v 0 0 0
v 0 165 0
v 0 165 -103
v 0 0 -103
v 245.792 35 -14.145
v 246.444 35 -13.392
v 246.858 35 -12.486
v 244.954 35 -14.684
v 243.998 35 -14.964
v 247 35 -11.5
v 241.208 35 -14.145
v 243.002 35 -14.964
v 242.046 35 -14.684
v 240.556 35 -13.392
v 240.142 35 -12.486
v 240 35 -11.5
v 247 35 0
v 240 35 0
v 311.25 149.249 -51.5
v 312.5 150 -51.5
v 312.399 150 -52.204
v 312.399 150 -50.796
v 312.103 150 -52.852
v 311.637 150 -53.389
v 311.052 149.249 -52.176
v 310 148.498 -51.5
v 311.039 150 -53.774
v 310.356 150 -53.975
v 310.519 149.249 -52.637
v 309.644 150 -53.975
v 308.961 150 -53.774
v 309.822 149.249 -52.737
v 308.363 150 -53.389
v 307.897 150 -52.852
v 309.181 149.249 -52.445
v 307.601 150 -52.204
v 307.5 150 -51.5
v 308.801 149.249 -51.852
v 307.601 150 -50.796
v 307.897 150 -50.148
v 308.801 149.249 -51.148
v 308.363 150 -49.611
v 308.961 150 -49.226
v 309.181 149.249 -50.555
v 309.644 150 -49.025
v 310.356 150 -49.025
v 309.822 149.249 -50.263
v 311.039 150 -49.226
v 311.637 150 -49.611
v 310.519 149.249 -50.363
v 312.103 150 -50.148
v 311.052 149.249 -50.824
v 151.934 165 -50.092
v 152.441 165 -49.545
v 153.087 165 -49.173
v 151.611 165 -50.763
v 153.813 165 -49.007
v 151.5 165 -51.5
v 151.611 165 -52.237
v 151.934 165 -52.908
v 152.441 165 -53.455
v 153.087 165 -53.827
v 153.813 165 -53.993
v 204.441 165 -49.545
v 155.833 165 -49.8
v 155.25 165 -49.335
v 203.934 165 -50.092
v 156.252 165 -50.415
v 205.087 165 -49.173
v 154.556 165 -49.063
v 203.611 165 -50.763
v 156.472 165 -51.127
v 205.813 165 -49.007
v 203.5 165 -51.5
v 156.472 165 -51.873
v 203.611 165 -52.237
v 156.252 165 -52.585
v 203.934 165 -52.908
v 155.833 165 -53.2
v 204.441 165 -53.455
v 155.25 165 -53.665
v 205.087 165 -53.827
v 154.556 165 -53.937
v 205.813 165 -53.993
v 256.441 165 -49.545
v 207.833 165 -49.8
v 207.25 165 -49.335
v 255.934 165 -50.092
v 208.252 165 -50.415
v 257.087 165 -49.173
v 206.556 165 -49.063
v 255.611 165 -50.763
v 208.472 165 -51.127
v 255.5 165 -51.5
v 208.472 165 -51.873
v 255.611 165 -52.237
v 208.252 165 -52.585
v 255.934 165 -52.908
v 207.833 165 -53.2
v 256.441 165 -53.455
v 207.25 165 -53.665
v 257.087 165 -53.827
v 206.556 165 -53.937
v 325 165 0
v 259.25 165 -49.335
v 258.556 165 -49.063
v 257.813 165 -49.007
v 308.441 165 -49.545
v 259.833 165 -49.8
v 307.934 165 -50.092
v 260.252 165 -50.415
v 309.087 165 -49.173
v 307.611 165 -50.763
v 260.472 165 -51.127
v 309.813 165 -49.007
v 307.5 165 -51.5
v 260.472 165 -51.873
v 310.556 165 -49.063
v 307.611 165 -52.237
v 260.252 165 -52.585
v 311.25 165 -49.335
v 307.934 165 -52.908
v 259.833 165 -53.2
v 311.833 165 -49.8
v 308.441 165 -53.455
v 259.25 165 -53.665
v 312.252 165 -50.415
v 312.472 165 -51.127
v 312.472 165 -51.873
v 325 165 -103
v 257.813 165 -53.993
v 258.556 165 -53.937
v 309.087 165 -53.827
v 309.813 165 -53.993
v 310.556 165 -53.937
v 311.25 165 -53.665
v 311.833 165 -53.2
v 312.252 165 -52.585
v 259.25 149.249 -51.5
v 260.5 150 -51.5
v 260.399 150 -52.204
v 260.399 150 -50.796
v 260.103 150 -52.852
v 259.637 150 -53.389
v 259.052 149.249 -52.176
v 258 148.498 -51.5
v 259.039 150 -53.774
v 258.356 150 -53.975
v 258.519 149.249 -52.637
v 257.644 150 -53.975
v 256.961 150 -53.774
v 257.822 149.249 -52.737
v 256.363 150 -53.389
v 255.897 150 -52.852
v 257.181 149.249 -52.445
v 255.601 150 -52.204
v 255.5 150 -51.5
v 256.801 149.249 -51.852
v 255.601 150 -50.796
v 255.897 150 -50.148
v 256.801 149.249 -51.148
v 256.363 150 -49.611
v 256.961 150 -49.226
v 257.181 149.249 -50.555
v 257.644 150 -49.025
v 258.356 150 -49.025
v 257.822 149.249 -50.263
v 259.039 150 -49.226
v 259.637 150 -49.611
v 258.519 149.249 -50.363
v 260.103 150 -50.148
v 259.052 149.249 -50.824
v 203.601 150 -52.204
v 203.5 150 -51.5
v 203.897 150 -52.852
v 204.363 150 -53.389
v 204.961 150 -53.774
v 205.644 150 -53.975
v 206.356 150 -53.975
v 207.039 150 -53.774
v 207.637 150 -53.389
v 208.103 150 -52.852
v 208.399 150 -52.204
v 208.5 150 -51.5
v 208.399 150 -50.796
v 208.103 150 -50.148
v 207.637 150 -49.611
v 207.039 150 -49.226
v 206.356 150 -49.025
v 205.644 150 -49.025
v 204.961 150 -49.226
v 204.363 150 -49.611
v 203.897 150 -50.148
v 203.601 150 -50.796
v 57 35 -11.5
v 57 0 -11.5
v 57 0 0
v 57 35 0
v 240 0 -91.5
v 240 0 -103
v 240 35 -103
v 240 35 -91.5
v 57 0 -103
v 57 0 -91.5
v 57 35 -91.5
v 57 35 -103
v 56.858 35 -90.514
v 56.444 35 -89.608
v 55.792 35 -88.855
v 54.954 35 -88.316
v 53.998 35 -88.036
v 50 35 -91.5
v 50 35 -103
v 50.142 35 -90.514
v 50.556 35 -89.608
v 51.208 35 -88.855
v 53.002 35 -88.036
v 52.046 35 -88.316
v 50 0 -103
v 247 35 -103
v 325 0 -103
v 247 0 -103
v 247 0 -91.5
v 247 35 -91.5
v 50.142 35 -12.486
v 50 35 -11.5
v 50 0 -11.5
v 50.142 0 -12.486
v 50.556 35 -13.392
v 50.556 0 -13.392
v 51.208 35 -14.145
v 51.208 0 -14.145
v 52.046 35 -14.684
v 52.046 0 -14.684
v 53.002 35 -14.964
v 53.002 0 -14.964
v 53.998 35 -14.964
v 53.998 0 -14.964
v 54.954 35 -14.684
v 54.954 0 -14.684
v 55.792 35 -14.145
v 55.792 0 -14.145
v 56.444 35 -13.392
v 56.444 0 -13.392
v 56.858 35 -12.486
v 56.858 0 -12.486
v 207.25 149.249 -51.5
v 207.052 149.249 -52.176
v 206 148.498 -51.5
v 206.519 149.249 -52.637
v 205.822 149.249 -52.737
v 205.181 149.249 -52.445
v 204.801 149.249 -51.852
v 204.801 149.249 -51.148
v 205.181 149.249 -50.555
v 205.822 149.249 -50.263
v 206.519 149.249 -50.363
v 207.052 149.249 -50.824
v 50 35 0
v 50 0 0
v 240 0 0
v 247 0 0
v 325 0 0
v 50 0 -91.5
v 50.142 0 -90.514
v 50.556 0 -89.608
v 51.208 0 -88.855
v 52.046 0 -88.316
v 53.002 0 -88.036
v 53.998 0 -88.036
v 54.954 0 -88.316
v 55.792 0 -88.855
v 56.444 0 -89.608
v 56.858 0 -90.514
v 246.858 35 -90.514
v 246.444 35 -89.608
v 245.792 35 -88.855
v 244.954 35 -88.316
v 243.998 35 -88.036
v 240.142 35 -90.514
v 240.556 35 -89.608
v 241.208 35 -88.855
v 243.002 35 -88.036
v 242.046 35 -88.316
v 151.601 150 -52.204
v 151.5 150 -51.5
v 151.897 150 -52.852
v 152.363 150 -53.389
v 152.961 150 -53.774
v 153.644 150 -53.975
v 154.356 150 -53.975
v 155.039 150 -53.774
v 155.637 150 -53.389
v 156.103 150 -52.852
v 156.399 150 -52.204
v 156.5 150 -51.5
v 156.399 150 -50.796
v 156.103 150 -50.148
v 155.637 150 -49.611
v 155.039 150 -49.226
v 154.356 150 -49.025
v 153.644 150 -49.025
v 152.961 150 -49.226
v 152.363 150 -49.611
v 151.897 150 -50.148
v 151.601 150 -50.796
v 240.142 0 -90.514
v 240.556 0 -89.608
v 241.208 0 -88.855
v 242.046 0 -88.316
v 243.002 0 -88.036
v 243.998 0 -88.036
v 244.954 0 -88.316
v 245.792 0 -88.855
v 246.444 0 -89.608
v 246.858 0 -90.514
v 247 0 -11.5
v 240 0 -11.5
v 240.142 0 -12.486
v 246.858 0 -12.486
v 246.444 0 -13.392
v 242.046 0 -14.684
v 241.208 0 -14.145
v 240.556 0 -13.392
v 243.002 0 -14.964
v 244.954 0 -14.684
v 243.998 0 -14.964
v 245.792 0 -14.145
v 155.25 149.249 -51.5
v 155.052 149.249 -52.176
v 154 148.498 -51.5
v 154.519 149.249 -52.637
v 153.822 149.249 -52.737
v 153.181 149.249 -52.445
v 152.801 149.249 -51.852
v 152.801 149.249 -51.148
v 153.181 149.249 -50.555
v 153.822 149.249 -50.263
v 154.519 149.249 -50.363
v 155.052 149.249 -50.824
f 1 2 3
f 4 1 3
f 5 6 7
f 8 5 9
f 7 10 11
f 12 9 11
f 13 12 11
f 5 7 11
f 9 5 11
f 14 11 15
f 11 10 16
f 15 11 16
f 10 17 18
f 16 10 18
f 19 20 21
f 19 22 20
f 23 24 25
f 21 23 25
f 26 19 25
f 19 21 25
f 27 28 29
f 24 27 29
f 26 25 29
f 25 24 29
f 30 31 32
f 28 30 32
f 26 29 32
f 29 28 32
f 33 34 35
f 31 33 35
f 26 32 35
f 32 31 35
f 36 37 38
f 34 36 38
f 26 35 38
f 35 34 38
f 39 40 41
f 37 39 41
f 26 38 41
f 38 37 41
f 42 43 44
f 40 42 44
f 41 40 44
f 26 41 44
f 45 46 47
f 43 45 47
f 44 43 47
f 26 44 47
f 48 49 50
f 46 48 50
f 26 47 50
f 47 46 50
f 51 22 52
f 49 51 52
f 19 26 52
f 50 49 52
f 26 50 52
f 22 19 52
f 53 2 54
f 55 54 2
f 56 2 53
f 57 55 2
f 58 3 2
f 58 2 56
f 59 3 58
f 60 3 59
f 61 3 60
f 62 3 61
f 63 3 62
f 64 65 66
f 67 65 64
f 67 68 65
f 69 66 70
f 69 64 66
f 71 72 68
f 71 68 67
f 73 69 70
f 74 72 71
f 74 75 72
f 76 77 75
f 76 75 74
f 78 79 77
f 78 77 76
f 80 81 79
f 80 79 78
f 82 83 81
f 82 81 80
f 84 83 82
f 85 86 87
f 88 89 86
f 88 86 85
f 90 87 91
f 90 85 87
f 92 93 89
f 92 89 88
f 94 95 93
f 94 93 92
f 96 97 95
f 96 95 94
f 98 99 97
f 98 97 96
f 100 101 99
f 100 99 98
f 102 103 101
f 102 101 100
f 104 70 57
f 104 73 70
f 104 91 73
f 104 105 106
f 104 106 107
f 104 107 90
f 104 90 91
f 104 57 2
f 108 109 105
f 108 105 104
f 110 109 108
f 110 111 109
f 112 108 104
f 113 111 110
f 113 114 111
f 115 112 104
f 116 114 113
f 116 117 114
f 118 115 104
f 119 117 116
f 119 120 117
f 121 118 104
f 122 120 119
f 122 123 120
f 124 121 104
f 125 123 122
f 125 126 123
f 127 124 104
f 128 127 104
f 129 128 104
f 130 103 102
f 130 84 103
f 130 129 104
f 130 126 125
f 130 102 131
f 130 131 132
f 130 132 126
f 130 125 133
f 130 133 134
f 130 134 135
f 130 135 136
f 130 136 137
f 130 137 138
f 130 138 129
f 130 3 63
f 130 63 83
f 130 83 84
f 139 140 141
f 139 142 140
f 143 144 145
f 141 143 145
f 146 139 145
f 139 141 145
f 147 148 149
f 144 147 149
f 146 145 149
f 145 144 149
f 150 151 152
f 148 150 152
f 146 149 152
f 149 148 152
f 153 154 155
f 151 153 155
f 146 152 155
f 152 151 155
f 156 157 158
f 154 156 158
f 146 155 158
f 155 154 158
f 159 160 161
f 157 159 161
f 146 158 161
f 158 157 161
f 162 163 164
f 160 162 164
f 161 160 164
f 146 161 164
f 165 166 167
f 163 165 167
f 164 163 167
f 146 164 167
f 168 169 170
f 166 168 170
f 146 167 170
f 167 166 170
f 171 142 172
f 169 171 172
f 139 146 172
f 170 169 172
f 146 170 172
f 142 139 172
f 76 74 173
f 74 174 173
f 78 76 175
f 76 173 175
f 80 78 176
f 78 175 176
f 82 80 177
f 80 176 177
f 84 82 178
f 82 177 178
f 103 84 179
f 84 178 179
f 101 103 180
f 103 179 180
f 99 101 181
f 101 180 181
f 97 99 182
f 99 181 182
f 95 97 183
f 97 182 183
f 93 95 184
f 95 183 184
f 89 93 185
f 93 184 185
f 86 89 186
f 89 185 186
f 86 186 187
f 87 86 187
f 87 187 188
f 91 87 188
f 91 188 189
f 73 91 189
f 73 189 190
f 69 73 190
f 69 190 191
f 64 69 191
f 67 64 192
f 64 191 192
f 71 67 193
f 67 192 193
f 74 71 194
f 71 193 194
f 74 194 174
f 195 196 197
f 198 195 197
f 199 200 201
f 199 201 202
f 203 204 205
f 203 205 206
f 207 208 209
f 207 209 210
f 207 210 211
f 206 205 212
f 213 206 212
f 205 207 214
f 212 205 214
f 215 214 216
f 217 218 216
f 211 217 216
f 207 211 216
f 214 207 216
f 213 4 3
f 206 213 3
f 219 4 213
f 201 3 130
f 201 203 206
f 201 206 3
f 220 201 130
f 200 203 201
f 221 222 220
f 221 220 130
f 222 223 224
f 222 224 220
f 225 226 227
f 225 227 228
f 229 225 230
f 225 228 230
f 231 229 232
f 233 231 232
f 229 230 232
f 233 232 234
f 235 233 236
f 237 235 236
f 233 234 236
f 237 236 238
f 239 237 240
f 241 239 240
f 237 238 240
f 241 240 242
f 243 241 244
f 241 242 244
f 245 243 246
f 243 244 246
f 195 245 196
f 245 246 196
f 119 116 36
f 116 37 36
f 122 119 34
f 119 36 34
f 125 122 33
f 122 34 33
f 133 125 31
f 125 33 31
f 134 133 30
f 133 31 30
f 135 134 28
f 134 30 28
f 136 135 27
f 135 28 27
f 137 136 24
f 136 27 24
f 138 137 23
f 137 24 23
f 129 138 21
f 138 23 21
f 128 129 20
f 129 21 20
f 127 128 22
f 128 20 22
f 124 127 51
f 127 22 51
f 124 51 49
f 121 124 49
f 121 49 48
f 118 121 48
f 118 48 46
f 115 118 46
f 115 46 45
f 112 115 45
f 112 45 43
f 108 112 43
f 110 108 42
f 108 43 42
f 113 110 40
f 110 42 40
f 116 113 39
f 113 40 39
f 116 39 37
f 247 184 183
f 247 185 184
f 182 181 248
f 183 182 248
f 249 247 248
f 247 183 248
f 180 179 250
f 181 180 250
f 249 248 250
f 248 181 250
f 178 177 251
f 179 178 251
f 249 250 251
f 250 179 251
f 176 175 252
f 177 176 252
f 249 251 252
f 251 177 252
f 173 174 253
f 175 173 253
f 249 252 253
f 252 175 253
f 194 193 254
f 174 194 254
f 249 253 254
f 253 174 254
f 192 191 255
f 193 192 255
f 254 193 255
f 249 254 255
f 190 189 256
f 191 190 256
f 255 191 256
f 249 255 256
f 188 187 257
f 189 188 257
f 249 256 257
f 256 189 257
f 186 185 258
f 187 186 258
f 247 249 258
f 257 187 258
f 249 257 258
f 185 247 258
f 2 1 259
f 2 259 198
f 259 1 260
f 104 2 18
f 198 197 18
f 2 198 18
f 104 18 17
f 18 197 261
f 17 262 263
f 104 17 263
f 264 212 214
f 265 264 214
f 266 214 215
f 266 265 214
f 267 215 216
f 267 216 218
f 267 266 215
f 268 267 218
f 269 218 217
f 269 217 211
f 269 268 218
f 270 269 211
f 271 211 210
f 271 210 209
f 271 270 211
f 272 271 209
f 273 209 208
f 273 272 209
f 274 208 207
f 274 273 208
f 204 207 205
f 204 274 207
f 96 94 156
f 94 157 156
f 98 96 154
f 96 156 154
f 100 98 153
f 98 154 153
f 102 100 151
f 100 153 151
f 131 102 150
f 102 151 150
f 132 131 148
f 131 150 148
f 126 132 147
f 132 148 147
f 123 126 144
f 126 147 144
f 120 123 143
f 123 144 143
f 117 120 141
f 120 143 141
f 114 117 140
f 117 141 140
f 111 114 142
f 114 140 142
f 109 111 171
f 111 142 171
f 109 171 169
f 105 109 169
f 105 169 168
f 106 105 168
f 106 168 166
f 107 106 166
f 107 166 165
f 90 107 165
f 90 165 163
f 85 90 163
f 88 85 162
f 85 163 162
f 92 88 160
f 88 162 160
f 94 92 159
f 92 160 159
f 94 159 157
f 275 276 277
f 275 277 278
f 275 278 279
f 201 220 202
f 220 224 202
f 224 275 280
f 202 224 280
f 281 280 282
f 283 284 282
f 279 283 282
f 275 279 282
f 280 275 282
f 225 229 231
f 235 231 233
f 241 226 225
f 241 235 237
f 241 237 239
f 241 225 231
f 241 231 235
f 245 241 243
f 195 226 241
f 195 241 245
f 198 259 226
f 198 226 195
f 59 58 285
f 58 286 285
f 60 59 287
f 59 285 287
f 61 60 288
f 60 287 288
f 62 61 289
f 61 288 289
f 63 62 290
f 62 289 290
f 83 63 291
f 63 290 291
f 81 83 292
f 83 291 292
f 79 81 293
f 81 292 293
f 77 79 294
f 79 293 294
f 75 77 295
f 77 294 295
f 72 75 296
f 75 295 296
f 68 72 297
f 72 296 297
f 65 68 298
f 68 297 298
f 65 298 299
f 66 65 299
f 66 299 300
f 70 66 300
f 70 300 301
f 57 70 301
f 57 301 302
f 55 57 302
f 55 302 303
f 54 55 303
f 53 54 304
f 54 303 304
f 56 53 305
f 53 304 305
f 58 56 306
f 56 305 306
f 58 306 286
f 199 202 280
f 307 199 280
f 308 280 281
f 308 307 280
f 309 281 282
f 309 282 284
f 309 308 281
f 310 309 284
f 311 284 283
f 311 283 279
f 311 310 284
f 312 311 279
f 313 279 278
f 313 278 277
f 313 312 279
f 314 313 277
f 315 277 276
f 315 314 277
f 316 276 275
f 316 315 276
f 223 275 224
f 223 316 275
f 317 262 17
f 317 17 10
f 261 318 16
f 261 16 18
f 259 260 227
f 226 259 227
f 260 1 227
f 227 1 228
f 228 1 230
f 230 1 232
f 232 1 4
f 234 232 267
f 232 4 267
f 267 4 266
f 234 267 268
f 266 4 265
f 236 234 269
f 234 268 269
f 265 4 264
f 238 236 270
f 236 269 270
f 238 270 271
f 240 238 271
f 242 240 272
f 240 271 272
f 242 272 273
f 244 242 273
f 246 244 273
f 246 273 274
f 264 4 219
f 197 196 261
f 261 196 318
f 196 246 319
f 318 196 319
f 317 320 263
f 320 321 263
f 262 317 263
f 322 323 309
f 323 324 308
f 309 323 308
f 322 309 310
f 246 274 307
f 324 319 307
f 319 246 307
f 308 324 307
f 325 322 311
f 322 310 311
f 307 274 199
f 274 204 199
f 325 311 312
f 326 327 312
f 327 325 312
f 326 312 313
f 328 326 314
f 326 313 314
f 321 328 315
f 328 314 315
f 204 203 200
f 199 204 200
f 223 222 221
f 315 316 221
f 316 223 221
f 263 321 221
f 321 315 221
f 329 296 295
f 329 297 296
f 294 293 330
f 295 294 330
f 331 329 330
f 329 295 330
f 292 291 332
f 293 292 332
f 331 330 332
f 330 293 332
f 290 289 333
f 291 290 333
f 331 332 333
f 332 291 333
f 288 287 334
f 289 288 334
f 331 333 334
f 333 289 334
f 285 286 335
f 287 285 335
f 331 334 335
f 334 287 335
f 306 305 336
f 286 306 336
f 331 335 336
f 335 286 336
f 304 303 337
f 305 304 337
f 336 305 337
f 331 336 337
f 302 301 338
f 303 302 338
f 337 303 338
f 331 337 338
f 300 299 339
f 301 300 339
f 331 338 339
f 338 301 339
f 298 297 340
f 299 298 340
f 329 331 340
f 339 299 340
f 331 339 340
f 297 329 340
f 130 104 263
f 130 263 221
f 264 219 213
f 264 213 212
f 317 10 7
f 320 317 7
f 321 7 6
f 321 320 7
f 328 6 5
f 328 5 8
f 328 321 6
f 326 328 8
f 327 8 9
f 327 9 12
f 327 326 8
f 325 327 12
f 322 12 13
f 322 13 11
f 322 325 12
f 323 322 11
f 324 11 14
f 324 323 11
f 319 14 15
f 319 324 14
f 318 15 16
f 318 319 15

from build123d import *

# Parameters (mm, degrees)
SKETCH1_W             = 325
SKETCH1_H             = 103
BOSS_EXTRUDE1_DEPTH   = 165
M6_TAPPED_HOLE1_D     = 5
M6_TAPPED_HOLE1_DEPTH = 15
M6_TAPPED_HOLE1_TIP   = 1.502151548
CUT_EXTRUDE1_DEPTH    = 35


with BuildPart() as part:
    # Sketch1 → Boss-Extrude1 (new body)
    with BuildSketch(Plane(origin=(0, 0, 0), x_dir=(1, 0, 0), z_dir=(0, 1, 0))):
        with Locations((162.5, 51.5)):
            Rectangle(SKETCH1_W, SKETCH1_H)
    extrude(amount=BOSS_EXTRUDE1_DEPTH)

    # M6 Tapped Hole1
    with Locations(Plane(origin=(0, 165, 0), x_dir=(1, 0, 0), z_dir=(0, 1, 0))):
        with Locations((310, 51.5), (258, 51.5), (206, 51.5), (154, 51.5)):
            Hole(M6_TAPPED_HOLE1_D / 2, depth=M6_TAPPED_HOLE1_DEPTH)
            with Locations((0, 0, -(M6_TAPPED_HOLE1_DEPTH + M6_TAPPED_HOLE1_TIP / 2))):  # 118° drill point
                Cone(0, M6_TAPPED_HOLE1_D / 2, M6_TAPPED_HOLE1_TIP, mode=Mode.SUBTRACT)

    # Sketch5 → Cut-Extrude1 (cut)
    with BuildSketch(Plane.XZ):
        with BuildLine():
            Line((50, 0), (50, -11.5))
            ThreePointArc((50, -11.5), (53.5, -15), (57, -11.5))
            Line((57, -11.5), (57, 0))
            Line((57, 0), (50, 0))
        make_face()
        with BuildLine():
            Line((247, 0), (247, -11.5))
            ThreePointArc((247, -11.5), (243.5, -15), (240, -11.5))
            Line((240, -11.5), (240, 0))
            Line((240, 0), (247, 0))
        make_face()
        with BuildLine():
            Line((247, -103), (240, -103))
            Line((240, -103), (240, -91.5))
            ThreePointArc((240, -91.5), (243.5, -88), (247, -91.5))
            Line((247, -91.5), (247, -103))
        make_face()
        with BuildLine():
            Line((50, -103), (50, -91.5))
            ThreePointArc((50, -91.5), (53.5, -88), (57, -91.5))
            Line((57, -91.5), (57, -103))
            Line((57, -103), (50, -103))
        make_face()
    extrude(amount=-CUT_EXTRUDE1_DEPTH, mode=Mode.SUBTRACT)


solid = part.part
